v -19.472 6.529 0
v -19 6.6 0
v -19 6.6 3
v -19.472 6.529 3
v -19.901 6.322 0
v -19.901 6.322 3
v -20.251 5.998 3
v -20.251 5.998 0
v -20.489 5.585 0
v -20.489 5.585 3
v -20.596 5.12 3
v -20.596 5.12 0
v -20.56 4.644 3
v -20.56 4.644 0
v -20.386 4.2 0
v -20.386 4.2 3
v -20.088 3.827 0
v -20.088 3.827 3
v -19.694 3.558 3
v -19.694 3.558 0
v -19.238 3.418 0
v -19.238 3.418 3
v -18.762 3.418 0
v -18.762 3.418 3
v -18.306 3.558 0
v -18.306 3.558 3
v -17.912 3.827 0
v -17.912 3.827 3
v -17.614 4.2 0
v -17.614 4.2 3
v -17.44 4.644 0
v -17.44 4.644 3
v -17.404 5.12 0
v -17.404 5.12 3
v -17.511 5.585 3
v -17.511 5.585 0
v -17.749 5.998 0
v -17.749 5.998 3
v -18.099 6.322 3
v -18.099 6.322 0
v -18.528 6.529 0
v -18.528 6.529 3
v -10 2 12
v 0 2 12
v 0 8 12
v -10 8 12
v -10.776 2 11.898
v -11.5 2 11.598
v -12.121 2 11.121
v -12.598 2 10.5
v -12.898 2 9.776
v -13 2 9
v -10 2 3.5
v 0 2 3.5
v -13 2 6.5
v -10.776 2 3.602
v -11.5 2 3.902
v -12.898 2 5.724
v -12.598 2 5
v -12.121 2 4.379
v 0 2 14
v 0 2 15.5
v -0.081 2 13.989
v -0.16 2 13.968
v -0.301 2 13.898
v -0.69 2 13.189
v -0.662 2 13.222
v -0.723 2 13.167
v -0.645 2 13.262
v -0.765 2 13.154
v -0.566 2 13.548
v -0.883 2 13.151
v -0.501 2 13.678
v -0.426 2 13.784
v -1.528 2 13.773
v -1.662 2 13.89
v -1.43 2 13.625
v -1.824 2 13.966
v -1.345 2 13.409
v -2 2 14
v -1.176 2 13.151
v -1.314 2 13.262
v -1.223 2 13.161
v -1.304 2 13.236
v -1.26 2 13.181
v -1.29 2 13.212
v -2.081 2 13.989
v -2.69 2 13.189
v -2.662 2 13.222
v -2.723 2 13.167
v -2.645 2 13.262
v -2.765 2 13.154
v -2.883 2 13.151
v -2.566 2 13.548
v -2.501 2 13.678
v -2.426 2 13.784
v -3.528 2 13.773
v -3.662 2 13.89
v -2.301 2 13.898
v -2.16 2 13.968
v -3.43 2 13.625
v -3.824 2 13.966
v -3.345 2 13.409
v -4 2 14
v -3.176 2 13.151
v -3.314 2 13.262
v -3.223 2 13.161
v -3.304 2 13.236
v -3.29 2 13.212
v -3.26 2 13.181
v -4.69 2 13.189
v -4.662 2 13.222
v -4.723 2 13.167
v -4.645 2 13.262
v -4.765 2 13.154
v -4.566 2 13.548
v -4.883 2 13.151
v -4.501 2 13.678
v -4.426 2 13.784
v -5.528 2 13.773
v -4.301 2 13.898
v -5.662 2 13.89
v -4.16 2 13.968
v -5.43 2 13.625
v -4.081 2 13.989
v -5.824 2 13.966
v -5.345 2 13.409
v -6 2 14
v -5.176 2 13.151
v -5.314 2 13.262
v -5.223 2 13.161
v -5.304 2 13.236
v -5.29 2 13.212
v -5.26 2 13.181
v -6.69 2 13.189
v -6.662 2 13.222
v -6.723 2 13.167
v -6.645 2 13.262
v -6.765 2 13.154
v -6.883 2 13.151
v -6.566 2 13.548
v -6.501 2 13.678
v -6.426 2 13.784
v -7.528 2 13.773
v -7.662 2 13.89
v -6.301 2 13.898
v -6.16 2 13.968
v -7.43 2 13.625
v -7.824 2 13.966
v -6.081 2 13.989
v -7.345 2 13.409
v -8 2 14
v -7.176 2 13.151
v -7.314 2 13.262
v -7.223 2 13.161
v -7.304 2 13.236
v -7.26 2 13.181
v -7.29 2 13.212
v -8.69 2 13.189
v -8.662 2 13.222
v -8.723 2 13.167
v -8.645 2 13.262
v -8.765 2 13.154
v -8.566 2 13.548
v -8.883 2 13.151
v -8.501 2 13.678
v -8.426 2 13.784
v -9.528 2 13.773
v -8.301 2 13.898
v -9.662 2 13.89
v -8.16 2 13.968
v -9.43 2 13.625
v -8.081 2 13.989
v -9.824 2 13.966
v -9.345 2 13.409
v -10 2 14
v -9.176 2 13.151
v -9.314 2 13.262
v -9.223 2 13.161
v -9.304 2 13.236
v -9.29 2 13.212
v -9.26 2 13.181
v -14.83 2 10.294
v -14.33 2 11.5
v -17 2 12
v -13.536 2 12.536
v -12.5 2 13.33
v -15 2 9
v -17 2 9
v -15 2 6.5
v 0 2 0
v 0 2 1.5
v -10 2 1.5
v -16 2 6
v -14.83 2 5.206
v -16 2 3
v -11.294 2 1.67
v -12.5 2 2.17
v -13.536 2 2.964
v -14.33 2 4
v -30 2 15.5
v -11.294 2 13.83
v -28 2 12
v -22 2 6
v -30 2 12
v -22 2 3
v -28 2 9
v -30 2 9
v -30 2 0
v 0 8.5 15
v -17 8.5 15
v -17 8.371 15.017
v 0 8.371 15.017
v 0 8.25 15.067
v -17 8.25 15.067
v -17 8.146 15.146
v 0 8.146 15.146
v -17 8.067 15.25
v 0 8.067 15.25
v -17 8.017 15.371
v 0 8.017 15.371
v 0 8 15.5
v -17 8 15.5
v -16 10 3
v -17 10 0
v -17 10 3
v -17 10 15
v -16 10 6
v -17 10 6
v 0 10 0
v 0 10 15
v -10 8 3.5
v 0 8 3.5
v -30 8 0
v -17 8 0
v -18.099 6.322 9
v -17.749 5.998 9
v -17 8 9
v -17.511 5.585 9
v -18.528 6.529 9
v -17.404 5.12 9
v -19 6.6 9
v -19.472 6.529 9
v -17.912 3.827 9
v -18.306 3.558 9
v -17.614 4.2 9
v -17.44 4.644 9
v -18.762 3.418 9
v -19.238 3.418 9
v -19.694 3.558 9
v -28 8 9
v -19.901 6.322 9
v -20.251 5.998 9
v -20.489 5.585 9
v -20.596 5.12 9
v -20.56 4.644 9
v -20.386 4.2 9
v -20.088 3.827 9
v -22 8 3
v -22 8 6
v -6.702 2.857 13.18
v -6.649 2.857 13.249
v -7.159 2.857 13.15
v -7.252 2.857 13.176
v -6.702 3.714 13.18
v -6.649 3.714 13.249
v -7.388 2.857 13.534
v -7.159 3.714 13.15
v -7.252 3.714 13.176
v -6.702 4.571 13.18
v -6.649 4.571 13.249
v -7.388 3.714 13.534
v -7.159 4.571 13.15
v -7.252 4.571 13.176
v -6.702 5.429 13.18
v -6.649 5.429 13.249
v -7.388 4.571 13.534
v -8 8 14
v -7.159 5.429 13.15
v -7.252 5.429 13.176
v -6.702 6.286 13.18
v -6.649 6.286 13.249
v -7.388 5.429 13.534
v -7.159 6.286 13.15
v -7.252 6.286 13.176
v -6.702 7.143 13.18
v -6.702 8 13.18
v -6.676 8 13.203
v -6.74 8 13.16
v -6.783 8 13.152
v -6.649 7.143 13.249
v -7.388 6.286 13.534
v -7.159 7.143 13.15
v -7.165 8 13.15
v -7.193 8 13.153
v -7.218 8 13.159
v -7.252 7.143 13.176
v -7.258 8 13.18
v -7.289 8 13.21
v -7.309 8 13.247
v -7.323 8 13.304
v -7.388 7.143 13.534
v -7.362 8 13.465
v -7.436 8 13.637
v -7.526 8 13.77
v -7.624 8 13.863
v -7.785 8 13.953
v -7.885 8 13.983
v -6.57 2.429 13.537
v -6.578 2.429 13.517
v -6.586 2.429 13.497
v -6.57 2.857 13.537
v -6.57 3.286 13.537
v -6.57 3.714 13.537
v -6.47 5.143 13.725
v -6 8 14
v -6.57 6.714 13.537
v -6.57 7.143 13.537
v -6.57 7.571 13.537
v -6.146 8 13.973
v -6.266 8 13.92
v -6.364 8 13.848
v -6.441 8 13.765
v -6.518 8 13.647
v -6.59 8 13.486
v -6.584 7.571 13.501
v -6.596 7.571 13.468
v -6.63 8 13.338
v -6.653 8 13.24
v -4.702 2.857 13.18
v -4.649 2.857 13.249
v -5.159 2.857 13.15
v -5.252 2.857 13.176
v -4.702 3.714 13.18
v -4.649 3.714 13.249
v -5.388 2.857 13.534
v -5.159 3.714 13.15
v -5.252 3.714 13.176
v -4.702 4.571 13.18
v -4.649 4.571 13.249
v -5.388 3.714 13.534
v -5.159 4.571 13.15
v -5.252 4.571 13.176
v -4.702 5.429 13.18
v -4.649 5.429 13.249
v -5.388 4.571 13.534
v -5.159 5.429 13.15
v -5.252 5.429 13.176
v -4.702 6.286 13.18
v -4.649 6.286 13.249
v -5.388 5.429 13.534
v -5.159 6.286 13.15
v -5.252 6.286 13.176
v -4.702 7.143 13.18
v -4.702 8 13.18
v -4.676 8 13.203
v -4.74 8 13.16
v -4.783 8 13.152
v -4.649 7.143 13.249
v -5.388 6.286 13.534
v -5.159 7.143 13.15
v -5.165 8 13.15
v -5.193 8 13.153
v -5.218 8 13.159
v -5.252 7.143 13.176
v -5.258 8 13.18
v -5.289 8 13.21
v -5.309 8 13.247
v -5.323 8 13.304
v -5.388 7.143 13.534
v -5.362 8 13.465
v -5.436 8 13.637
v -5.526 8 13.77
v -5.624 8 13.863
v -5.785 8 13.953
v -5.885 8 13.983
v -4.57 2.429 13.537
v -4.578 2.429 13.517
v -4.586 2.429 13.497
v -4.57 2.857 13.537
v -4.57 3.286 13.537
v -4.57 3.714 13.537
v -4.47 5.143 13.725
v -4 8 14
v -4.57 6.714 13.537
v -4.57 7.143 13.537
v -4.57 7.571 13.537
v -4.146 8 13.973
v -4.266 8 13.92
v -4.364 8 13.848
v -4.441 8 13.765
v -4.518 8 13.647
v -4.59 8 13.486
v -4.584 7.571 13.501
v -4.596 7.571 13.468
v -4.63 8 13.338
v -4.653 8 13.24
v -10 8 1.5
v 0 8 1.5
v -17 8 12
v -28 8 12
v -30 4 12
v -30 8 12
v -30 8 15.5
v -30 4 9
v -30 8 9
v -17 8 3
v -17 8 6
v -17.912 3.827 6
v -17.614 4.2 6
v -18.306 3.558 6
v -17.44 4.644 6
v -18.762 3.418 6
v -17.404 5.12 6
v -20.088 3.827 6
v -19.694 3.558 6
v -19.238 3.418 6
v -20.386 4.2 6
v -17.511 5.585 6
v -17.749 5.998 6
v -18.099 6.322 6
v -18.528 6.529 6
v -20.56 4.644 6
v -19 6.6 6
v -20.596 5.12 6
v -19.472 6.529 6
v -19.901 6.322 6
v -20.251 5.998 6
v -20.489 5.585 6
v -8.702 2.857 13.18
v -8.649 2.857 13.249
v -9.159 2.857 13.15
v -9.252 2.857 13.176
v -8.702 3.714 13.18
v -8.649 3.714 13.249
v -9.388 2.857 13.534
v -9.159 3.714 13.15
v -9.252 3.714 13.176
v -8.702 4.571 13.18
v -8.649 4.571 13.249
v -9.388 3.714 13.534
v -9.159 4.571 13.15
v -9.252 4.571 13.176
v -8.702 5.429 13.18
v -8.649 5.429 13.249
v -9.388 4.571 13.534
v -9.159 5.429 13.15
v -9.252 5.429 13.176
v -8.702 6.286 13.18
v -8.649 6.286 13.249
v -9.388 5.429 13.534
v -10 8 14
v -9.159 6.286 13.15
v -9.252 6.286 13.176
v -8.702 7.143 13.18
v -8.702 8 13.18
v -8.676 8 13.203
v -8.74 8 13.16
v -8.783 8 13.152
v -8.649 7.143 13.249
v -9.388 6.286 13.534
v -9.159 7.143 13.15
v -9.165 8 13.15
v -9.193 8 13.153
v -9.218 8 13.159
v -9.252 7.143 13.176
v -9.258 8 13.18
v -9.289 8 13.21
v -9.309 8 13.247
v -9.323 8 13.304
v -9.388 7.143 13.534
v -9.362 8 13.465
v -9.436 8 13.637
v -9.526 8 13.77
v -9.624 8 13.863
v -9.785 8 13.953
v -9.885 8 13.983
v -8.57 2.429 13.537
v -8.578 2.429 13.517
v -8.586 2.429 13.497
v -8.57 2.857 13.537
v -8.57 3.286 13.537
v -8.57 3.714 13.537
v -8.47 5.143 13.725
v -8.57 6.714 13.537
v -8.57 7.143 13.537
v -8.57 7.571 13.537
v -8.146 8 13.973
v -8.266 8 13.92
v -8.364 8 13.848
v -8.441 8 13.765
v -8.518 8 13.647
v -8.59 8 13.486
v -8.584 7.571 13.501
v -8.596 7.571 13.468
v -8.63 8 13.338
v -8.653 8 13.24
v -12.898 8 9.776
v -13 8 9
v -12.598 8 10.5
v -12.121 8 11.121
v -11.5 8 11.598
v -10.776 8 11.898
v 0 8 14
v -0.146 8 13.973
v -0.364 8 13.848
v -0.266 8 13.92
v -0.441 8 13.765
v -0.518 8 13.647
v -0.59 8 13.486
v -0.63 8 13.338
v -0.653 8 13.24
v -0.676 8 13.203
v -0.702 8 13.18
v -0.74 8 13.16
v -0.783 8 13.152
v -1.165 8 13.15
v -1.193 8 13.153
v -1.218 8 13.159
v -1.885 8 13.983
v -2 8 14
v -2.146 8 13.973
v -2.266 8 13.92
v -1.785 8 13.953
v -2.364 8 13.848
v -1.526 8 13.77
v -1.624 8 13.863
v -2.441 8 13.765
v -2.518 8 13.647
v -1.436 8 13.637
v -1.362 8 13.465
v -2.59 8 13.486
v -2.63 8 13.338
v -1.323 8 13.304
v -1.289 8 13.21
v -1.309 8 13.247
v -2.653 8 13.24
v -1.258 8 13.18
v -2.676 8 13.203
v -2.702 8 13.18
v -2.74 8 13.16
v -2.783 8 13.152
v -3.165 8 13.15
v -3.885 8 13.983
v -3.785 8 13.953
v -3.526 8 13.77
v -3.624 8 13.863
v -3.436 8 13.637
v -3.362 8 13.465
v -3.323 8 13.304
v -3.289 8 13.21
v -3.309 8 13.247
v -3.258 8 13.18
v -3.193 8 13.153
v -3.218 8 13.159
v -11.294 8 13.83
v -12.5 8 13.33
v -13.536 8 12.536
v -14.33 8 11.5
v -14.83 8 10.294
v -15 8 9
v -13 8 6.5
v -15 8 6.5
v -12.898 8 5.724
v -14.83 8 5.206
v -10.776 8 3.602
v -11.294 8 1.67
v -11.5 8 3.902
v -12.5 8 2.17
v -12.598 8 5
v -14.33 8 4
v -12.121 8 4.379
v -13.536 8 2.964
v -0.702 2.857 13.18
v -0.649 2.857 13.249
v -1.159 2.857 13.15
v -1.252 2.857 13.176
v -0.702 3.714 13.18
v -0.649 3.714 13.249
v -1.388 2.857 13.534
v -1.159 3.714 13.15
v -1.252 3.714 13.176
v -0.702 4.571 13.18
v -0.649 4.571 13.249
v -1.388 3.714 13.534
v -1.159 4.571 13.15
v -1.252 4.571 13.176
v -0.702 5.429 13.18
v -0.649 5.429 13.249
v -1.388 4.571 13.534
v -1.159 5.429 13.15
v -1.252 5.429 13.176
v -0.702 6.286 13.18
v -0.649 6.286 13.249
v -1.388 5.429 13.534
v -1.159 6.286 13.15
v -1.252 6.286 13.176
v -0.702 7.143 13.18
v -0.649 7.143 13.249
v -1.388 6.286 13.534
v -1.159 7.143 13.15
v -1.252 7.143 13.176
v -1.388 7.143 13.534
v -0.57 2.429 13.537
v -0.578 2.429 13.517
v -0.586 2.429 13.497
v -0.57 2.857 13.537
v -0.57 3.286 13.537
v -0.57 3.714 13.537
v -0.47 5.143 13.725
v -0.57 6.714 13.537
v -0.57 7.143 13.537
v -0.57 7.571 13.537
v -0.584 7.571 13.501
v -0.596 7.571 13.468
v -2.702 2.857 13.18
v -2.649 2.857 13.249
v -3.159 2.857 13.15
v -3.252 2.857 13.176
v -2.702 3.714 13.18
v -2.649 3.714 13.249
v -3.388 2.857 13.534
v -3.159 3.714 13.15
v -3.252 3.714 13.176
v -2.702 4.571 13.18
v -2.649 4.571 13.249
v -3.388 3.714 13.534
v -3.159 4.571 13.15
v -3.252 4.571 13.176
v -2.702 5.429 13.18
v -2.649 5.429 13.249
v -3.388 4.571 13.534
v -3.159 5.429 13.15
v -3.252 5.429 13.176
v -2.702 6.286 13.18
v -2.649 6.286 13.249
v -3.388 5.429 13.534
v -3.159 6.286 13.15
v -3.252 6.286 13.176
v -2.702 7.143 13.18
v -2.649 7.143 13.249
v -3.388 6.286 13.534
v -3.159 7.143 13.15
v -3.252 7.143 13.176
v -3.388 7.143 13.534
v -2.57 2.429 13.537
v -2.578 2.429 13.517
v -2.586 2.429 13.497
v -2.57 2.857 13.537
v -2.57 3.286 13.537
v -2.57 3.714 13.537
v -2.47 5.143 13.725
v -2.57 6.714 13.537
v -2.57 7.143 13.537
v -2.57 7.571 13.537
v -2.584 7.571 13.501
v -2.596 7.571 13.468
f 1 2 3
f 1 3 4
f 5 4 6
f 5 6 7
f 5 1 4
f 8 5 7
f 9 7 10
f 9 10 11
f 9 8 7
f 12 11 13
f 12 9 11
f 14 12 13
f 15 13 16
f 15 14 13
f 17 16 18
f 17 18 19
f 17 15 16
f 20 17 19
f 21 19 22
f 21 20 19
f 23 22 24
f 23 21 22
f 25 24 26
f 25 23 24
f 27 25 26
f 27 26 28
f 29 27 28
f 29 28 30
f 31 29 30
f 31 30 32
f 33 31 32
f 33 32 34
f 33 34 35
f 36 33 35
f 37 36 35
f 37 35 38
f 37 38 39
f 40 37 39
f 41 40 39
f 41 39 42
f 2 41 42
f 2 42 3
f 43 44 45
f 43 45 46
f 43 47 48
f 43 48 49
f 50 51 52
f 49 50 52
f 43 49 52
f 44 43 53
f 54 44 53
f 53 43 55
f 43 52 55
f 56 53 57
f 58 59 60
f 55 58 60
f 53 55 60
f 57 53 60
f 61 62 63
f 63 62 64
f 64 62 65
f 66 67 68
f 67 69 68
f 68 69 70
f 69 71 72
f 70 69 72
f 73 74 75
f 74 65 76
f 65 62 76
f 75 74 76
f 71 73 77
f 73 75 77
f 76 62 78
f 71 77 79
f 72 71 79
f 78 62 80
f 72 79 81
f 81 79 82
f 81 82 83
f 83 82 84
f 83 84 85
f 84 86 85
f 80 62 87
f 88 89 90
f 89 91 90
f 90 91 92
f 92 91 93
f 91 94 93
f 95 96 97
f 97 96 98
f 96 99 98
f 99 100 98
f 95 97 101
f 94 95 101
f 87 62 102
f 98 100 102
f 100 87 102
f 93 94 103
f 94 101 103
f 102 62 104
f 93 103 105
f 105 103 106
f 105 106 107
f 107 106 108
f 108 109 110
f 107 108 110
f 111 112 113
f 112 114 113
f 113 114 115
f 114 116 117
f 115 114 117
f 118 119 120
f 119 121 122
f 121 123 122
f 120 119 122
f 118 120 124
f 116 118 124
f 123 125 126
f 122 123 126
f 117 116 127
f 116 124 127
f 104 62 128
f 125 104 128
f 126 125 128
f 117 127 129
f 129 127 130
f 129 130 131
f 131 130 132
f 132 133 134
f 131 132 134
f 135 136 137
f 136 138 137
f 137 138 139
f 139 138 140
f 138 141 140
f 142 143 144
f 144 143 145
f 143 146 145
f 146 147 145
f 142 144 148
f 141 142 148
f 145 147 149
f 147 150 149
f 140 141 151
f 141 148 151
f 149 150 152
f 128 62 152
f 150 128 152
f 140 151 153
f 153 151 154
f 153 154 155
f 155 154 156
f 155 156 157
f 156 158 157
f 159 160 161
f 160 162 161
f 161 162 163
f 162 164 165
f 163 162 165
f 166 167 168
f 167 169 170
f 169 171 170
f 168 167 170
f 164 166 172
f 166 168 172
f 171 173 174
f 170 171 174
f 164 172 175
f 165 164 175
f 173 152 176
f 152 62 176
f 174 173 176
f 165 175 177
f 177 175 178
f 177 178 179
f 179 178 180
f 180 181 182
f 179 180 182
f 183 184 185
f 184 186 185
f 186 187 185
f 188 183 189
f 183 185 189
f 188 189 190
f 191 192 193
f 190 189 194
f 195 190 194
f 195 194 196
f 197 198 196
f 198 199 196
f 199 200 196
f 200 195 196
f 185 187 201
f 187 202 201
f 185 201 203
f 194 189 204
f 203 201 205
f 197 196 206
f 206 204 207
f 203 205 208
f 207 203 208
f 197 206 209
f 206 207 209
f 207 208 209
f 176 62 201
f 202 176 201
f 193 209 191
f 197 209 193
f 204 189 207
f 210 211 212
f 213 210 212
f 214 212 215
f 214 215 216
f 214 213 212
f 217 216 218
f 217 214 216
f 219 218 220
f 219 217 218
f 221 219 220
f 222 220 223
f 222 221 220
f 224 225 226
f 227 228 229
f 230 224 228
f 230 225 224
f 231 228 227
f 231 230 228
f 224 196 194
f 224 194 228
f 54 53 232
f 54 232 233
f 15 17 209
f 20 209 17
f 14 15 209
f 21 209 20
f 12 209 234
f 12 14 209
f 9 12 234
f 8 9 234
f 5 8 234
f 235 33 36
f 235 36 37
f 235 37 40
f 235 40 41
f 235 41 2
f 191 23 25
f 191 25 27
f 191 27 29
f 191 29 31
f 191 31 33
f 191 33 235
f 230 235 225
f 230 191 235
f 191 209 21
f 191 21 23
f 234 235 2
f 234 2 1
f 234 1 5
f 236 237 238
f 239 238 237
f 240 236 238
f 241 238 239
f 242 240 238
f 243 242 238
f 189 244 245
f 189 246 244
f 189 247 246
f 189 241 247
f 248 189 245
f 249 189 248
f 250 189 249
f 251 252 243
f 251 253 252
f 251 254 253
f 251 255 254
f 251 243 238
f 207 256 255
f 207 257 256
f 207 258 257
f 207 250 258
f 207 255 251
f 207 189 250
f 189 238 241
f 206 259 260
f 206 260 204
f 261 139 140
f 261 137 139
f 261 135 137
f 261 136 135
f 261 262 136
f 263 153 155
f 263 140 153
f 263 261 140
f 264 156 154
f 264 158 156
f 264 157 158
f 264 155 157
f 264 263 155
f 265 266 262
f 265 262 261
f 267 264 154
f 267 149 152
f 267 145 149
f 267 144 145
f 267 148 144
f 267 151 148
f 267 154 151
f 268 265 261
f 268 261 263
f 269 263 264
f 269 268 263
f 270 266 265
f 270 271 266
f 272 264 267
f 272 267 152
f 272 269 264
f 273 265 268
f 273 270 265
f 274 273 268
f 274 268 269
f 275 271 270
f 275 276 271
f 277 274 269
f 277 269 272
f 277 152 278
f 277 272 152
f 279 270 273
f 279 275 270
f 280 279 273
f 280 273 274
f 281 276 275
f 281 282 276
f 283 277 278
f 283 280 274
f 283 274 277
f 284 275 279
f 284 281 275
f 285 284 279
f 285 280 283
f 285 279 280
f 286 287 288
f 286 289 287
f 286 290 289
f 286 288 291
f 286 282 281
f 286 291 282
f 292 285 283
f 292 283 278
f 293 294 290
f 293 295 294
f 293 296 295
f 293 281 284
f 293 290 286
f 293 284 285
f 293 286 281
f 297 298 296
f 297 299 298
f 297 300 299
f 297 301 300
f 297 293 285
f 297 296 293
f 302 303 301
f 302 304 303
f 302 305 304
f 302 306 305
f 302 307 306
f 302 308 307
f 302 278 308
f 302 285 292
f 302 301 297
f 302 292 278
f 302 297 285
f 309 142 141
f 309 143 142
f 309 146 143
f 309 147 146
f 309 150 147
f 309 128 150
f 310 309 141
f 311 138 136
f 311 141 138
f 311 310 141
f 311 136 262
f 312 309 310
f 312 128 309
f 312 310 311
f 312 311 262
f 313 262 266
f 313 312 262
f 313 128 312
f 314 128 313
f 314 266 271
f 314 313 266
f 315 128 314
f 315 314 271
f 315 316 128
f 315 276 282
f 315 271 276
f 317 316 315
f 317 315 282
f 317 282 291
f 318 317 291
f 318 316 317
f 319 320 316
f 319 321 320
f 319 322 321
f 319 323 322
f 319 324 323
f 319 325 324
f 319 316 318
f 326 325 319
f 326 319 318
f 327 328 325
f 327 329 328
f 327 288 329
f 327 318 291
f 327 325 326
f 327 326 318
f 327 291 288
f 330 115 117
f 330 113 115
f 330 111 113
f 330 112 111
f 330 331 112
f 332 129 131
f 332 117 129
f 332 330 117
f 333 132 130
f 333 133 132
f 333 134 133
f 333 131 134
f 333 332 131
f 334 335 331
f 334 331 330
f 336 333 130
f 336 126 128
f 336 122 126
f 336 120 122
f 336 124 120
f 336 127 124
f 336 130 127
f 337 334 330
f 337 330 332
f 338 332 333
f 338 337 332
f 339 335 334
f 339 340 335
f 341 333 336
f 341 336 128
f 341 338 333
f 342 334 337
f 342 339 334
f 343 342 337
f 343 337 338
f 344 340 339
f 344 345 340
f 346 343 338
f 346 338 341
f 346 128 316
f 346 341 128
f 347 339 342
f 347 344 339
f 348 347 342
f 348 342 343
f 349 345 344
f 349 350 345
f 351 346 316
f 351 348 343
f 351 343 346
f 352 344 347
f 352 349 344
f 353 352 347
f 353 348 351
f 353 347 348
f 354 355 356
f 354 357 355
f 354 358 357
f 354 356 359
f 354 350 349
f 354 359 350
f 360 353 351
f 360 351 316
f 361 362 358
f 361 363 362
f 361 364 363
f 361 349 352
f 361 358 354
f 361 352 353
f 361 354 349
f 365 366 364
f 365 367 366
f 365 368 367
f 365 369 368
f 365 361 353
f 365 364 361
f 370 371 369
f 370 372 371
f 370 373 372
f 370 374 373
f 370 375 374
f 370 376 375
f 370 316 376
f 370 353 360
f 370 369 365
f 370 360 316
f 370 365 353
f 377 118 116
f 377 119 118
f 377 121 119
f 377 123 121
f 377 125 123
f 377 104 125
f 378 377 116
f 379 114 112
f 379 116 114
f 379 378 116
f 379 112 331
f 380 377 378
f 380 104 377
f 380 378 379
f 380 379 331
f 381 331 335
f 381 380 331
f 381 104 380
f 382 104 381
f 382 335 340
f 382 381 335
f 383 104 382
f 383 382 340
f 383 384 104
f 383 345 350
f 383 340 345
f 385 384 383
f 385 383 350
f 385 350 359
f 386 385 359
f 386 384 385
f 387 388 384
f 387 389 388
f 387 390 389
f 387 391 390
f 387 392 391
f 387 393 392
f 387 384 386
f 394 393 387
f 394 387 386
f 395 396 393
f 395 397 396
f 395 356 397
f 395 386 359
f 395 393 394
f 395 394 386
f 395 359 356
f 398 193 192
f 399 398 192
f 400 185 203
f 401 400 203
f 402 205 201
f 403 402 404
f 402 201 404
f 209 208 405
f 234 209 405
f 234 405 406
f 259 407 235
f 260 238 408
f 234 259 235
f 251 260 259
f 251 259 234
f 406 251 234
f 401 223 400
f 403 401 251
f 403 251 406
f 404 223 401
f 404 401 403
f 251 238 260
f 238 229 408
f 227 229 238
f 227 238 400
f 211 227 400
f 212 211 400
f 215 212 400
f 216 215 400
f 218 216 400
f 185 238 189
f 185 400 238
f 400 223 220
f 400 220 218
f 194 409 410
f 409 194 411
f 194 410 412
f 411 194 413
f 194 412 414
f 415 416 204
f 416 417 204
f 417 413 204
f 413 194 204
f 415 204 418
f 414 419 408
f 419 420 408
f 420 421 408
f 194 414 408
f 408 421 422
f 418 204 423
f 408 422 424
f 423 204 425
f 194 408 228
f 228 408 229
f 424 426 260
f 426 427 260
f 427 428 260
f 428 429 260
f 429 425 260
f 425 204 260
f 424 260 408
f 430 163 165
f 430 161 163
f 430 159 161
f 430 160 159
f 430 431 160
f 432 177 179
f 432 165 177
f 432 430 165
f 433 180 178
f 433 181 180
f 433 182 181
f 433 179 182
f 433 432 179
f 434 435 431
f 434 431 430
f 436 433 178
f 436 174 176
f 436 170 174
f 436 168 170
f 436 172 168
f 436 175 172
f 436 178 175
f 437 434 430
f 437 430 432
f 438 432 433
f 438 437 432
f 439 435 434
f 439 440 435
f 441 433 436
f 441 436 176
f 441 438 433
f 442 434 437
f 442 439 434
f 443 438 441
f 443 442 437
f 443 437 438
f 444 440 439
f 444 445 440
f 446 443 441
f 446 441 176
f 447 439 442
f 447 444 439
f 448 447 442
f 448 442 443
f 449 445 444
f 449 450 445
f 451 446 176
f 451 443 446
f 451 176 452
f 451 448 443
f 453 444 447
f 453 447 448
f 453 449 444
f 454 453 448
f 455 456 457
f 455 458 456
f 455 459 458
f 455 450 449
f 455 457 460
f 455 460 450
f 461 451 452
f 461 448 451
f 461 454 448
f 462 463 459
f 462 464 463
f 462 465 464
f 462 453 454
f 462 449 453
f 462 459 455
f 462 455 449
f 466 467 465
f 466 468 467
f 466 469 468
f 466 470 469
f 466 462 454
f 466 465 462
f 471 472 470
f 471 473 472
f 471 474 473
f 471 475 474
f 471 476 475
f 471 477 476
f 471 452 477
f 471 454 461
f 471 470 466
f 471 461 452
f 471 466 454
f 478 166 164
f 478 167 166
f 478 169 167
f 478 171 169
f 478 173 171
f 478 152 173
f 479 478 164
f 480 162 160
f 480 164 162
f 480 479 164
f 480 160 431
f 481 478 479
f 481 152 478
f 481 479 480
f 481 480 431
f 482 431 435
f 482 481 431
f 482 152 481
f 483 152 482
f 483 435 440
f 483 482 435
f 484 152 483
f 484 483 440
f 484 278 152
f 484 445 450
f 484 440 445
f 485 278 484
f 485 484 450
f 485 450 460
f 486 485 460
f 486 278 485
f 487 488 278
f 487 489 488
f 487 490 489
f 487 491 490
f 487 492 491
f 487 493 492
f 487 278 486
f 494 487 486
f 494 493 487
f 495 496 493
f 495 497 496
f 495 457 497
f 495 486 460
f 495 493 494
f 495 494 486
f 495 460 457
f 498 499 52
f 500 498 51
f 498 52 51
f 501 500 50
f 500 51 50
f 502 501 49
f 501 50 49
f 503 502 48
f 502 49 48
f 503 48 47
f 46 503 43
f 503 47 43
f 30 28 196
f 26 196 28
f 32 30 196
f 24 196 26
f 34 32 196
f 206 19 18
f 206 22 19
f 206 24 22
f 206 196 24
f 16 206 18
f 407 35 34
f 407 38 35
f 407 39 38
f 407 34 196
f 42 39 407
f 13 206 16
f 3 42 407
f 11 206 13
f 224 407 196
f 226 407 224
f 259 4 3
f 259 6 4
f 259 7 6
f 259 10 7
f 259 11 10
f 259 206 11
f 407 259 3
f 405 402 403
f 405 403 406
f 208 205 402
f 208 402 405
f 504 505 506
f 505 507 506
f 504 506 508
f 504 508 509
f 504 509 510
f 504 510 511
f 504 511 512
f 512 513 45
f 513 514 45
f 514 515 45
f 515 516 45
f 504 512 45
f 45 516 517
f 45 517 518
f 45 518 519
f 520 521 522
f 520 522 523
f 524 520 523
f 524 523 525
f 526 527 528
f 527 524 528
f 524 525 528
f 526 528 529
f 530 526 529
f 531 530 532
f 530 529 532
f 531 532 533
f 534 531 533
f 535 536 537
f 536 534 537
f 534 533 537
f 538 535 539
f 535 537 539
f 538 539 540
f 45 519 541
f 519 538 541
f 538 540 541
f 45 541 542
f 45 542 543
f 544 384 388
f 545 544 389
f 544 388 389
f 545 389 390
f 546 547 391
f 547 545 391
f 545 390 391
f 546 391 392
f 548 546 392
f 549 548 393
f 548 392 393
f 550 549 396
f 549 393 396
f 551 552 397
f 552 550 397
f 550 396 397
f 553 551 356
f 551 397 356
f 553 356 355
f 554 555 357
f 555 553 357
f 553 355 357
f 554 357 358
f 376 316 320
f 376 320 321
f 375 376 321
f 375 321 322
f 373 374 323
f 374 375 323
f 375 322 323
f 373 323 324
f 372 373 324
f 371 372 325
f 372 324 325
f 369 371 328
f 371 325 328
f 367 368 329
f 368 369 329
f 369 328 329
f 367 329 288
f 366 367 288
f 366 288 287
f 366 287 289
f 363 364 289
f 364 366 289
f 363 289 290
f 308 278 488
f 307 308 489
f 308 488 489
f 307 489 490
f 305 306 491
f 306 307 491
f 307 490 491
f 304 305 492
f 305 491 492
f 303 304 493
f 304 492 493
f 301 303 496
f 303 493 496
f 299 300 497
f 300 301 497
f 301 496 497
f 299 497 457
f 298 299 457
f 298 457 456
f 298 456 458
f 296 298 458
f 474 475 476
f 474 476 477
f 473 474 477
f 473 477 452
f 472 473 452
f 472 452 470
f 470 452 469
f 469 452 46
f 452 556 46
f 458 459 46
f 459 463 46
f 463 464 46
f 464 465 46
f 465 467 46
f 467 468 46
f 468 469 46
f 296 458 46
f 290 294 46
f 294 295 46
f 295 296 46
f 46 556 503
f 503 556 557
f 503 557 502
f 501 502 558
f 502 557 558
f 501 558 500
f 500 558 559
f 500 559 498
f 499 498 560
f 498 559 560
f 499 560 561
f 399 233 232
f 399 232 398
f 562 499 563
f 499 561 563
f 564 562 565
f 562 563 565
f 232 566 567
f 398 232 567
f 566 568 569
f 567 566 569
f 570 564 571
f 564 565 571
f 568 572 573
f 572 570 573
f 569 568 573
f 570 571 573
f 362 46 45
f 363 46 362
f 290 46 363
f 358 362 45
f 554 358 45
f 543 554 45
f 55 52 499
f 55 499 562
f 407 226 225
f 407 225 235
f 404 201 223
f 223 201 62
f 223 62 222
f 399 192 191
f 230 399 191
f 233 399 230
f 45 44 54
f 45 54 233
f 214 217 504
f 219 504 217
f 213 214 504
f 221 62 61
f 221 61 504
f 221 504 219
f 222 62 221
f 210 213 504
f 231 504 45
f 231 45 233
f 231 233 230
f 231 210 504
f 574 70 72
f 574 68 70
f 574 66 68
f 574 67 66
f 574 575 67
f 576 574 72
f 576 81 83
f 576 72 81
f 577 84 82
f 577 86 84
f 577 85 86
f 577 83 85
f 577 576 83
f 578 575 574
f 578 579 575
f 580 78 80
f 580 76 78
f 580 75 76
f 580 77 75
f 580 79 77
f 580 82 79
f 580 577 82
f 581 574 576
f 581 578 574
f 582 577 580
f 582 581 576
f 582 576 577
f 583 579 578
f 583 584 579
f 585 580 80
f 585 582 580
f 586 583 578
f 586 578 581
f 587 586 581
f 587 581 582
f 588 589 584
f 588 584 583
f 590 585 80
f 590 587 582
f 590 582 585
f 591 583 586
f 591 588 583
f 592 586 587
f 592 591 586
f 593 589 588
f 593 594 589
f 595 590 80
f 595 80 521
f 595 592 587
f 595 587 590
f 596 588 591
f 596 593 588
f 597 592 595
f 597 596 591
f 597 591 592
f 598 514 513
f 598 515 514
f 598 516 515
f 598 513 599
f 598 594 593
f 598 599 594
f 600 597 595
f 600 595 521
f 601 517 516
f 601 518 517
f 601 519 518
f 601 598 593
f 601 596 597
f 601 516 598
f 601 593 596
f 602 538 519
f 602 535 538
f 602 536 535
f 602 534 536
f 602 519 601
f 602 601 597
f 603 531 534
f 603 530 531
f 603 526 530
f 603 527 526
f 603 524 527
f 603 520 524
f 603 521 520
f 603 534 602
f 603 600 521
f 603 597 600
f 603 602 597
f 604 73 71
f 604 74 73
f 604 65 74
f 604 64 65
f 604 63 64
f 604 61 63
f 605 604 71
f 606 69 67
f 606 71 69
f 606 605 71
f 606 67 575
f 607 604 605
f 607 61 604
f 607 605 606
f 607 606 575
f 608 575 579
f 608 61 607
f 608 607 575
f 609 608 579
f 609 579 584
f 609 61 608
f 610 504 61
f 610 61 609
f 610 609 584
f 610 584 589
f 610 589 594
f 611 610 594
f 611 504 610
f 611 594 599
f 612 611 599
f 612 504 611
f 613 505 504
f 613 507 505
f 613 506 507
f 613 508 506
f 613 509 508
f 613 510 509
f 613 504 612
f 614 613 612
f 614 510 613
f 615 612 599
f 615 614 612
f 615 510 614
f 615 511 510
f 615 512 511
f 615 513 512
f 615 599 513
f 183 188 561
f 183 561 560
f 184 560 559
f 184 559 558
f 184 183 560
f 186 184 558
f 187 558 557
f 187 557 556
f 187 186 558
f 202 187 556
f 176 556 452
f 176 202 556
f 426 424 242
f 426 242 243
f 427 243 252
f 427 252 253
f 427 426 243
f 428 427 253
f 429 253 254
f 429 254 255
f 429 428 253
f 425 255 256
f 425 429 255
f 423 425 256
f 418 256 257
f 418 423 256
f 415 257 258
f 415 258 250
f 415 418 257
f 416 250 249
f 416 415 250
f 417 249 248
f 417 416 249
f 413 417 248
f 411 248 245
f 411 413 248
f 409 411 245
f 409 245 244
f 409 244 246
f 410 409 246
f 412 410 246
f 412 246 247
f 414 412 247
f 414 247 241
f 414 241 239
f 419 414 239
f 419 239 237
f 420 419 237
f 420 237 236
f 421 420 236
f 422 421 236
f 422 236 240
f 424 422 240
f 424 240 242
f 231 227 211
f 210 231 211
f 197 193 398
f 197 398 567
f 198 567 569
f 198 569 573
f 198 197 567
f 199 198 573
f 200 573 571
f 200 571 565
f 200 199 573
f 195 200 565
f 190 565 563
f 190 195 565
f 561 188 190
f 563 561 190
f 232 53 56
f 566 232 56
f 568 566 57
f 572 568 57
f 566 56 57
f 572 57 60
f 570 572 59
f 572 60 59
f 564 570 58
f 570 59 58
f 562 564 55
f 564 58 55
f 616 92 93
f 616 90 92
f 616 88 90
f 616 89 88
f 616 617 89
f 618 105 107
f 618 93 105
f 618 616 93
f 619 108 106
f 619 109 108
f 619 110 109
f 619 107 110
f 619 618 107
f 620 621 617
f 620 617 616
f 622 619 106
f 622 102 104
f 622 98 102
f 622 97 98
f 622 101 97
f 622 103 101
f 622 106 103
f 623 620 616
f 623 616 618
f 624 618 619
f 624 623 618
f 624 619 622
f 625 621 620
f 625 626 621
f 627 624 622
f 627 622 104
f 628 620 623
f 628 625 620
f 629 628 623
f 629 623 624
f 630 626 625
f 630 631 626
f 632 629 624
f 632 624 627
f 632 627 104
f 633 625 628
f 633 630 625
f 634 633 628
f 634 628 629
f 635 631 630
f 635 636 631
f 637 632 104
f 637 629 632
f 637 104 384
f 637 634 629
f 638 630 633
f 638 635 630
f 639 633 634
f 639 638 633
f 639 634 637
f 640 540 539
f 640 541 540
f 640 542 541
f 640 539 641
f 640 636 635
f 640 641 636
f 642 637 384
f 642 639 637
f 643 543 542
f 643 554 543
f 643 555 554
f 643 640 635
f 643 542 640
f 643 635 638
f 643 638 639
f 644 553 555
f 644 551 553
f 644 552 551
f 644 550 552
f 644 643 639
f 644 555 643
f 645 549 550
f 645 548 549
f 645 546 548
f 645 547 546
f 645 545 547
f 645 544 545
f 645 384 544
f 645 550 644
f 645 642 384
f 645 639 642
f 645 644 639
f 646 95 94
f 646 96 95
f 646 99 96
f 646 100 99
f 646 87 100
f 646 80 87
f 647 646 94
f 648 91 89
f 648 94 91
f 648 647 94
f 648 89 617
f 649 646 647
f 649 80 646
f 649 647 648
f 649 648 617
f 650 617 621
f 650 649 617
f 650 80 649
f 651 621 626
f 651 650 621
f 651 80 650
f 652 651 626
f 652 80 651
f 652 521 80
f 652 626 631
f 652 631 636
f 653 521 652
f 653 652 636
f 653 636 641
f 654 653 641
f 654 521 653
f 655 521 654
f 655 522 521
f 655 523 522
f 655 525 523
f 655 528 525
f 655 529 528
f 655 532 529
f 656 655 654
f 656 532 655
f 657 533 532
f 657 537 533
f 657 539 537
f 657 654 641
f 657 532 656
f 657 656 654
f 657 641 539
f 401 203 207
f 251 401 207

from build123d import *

# Parameters (mm, degrees)
SKETCH_W        = 10
SKETCH_H        = 15.5
PAD_DEPTH       = 30
POCKET001_DEPTH = 30.001
SKETCH003_W     = 3
SKETCH003_H     = 11
SKETCH003_H_2   = 1.990637
POCKET002_DEPTH = 10.001
SKETCH004_W     = 2
SKETCH004_H     = 13
POCKET003_DEPTH = 15.501
SKETCH005_W     = 2
SKETCH005_H     = 13
POCKET004_DEPTH = 15.501
POCKET005_DEPTH = 8
PAD001_DEPTH    = 8
SKETCH010_R     = 1.6
POCKET006_DEPTH = 10
SKETCH013_W     = 2
SKETCH013_H     = 20
POCKET008_DEPTH = 17.001
POCKET009_DEPTH = 3


with BuildPart() as framebase:
    # Sketch → Pad (new body)
    with BuildSketch(Plane.YZ):
        with Locations((5, 7.75)):
            Rectangle(SKETCH_W, SKETCH_H)
    extrude(amount=PAD_DEPTH)

    # Sketch002 (on DatumPlane) → Pocket001 (cut, through all)
    with BuildSketch(Plane(origin=(0, 10, 15.5), x_dir=(0, 1, 0), z_dir=(-1, 0, 0))):
        with BuildLine():
            ThreePointArc((0, -0.5), (0.5, 0), (0, 0.5))
            Line((0, 0.5), (-1.5, 0.5))
            ThreePointArc((-1.5, 0.5), (-2, 0), (-1.5, -0.5))
            Line((0, -0.5), (-1.5, -0.5))
        make_face()
    extrude(amount=-POCKET001_DEPTH, mode=Mode.SUBTRACT)

    # Sketch003 (on DatumPlane) → Pocket002 (cut, through all)
    with BuildSketch(Plane(origin=(30, 0, 15.5), x_dir=(0, 0, -1), z_dir=(0, -1, 0))):
        with Locations((5, -7.5)):
            Rectangle(SKETCH003_W, SKETCH003_H)
        with Locations((5, 0.995318)):
            Rectangle(SKETCH003_W, SKETCH003_H_2)
    extrude(amount=-POCKET002_DEPTH, mode=Mode.SUBTRACT)

    # Sketch004 (on DatumPlane) → Pocket003 (cut, through all)
    with BuildSketch(Plane(origin=(30, 0, 15.5), x_dir=(0, -1, 0), z_dir=(0, 0, 1))):
        with Locations((-1, -6.5)):
            Rectangle(SKETCH004_W, SKETCH004_H)
    extrude(amount=-POCKET003_DEPTH, mode=Mode.SUBTRACT)

    # Sketch005 (on DatumPlane) → Pocket004 (cut, through all)
    with BuildSketch(Plane(origin=(30, 10, 15.5), x_dir=(0, -1, 0), z_dir=(0, 0, 1))):
        with Locations((1, -6.5)):
            Rectangle(SKETCH005_W, SKETCH005_H)
    extrude(amount=-POCKET004_DEPTH, mode=Mode.SUBTRACT)

    # Sketch006 (on DatumPlane) → Pocket005 (cut)
    with BuildSketch(Plane(origin=(0, 0, 15.5), x_dir=(0, 0, -1), z_dir=(0, -1, 0))):
        with BuildLine():
            Line((1.5, 0), (3.5, 0))
            Line((3.5, 0), (3.5, 10))
            ThreePointArc((6.5, 13), (4.37868, 12.12132), (3.5, 10))
            Line((6.5, 13), (9, 13))
            ThreePointArc((12, 10), (11.12132, 12.12132), (9, 13))
            Line((12, 10), (12, 0))
            Line((12, 0), (14, 0))
            Line((14, 10), (14, 0))
            ThreePointArc((14, 10), (12.535534, 13.535534), (9, 15))
            Line((6.5, 15), (9, 15))
            ThreePointArc((6.5, 15), (2.964466, 13.535534), (1.5, 10))
            Line((1.5, 10), (1.5, 0))
        make_face()
    extrude(amount=-POCKET005_DEPTH, mode=Mode.SUBTRACT)

    # Sketch008 (on DatumPlane) → Pad001 (join)
    with BuildSketch(Plane(origin=(0, 8, 14), x_dir=(1, 0, 0), z_dir=(0, -1, 0))):
        with BuildLine():
            add(Edge.make_bspline(
                [(0, 0), (0.35359, -0.026741), (0.649381, -0.565336), (0.617792, -0.761919), (0.721021, -0.848783), (0.871627, -0.848783), (1.086099, -0.848783), (1.231939, -0.850694), (1.339653, -0.771577), (1.309148, -0.564354), (1.603926, -0.032231), (2, 0)],
                knots=[0, 0, 0, 0, 0.142857, 0.285714, 0.428571, 0.428571, 0.571429, 0.571429, 0.714286, 0.857143, 1, 1, 1, 1], degree=3))
            add(Edge.make_bspline(
                [(2, 0), (2.35359, -0.026741), (2.649381, -0.565336), (2.617792, -0.761919), (2.721021, -0.848783), (2.871627, -0.848783), (3.086099, -0.848783), (3.231939, -0.850694), (3.339653, -0.771577), (3.309148, -0.564354), (3.603926, -0.032231), (4, 0)],
                knots=[0, 0, 0, 0, 0.142857, 0.285714, 0.428571, 0.428571, 0.571429, 0.571429, 0.714286, 0.857143, 1, 1, 1, 1], degree=3))
            add(Edge.make_bspline(
                [(4, 0), (4.35359, -0.026741), (4.649381, -0.565336), (4.617792, -0.761919), (4.721021, -0.848783), (4.871627, -0.848783), (5.086099, -0.848783), (5.231939, -0.850694), (5.339653, -0.771577), (5.309148, -0.564354), (5.603926, -0.032231), (6, 0)],
                knots=[0, 0, 0, 0, 0.142857, 0.285714, 0.428571, 0.428571, 0.571429, 0.571429, 0.714286, 0.857143, 1, 1, 1, 1], degree=3))
            add(Edge.make_bspline(
                [(6, 0), (6.35359, -0.026741), (6.649381, -0.565336), (6.617792, -0.761919), (6.721021, -0.848783), (6.871627, -0.848783), (7.086099, -0.848783), (7.231939, -0.850694), (7.339653, -0.771577), (7.309148, -0.564354), (7.603926, -0.032231), (8, 0)],
                knots=[0, 0, 0, 0, 0.142857, 0.285714, 0.428571, 0.428571, 0.571429, 0.571429, 0.714286, 0.857143, 1, 1, 1, 1], degree=3))
            add(Edge.make_bspline(
                [(8, 0), (8.35359, -0.026741), (8.649381, -0.565336), (8.617792, -0.761919), (8.721021, -0.848783), (8.871627, -0.848783), (9.086099, -0.848783), (9.231939, -0.850694), (9.339653, -0.771577), (9.309148, -0.564354), (9.603926, -0.032231), (10, 0)],
                knots=[0, 0, 0, 0, 0.142857, 0.285714, 0.428571, 0.428571, 0.571429, 0.571429, 0.714286, 0.857143, 1, 1, 1, 1], degree=3))
            Line((10, 0), (10, 1))
            Line((10, 1), (0, 1))
            Line((0, 1), (0, 0))
        make_face()
    extrude(amount=PAD001_DEPTH)

    # Sketch010 (on DatumPlane) → Pocket006 (cut)
    with BuildSketch(Plane(origin=(30, 0, 0), x_dir=(0, 1, 0), z_dir=(0, 0, -1))):
        with Locations((5, -11)):
            Circle(SKETCH010_R)
    extrude(amount=-POCKET006_DEPTH, mode=Mode.SUBTRACT)

    # Sketch013 (on DatumPlane) → Pocket008 (cut, through all)
    with BuildSketch(Plane(origin=(17, 2, 15.5), x_dir=(0, -1, 0), z_dir=(1, 0, 0))):
        with Locations((1, 10)):
            Rectangle(SKETCH013_W, SKETCH013_H)
    extrude(amount=-POCKET008_DEPTH, mode=Mode.SUBTRACT)

    # Sketch014 (on DatumPlane) → Pocket009 (cut)
    with BuildSketch(Plane(origin=(30, 0, 3), x_dir=(0, 1, 0), z_dir=(0, 0, -1))):
        Polygon((8, -8), (2, -8), (2, -14), (8, -14), (18, -14), (18, -8), align=None)
    extrude(amount=-POCKET009_DEPTH, mode=Mode.SUBTRACT)


with BuildPart() as framebase_right_mirrored:
    # Part__Mirroring: instance of FrameBase
    add(framebase.part.mirror(Plane(origin=(0, 0, 0), x_dir=(0, -1, 0), z_dir=(1, 0, 0))))


solid = framebase_right_mirrored.part
